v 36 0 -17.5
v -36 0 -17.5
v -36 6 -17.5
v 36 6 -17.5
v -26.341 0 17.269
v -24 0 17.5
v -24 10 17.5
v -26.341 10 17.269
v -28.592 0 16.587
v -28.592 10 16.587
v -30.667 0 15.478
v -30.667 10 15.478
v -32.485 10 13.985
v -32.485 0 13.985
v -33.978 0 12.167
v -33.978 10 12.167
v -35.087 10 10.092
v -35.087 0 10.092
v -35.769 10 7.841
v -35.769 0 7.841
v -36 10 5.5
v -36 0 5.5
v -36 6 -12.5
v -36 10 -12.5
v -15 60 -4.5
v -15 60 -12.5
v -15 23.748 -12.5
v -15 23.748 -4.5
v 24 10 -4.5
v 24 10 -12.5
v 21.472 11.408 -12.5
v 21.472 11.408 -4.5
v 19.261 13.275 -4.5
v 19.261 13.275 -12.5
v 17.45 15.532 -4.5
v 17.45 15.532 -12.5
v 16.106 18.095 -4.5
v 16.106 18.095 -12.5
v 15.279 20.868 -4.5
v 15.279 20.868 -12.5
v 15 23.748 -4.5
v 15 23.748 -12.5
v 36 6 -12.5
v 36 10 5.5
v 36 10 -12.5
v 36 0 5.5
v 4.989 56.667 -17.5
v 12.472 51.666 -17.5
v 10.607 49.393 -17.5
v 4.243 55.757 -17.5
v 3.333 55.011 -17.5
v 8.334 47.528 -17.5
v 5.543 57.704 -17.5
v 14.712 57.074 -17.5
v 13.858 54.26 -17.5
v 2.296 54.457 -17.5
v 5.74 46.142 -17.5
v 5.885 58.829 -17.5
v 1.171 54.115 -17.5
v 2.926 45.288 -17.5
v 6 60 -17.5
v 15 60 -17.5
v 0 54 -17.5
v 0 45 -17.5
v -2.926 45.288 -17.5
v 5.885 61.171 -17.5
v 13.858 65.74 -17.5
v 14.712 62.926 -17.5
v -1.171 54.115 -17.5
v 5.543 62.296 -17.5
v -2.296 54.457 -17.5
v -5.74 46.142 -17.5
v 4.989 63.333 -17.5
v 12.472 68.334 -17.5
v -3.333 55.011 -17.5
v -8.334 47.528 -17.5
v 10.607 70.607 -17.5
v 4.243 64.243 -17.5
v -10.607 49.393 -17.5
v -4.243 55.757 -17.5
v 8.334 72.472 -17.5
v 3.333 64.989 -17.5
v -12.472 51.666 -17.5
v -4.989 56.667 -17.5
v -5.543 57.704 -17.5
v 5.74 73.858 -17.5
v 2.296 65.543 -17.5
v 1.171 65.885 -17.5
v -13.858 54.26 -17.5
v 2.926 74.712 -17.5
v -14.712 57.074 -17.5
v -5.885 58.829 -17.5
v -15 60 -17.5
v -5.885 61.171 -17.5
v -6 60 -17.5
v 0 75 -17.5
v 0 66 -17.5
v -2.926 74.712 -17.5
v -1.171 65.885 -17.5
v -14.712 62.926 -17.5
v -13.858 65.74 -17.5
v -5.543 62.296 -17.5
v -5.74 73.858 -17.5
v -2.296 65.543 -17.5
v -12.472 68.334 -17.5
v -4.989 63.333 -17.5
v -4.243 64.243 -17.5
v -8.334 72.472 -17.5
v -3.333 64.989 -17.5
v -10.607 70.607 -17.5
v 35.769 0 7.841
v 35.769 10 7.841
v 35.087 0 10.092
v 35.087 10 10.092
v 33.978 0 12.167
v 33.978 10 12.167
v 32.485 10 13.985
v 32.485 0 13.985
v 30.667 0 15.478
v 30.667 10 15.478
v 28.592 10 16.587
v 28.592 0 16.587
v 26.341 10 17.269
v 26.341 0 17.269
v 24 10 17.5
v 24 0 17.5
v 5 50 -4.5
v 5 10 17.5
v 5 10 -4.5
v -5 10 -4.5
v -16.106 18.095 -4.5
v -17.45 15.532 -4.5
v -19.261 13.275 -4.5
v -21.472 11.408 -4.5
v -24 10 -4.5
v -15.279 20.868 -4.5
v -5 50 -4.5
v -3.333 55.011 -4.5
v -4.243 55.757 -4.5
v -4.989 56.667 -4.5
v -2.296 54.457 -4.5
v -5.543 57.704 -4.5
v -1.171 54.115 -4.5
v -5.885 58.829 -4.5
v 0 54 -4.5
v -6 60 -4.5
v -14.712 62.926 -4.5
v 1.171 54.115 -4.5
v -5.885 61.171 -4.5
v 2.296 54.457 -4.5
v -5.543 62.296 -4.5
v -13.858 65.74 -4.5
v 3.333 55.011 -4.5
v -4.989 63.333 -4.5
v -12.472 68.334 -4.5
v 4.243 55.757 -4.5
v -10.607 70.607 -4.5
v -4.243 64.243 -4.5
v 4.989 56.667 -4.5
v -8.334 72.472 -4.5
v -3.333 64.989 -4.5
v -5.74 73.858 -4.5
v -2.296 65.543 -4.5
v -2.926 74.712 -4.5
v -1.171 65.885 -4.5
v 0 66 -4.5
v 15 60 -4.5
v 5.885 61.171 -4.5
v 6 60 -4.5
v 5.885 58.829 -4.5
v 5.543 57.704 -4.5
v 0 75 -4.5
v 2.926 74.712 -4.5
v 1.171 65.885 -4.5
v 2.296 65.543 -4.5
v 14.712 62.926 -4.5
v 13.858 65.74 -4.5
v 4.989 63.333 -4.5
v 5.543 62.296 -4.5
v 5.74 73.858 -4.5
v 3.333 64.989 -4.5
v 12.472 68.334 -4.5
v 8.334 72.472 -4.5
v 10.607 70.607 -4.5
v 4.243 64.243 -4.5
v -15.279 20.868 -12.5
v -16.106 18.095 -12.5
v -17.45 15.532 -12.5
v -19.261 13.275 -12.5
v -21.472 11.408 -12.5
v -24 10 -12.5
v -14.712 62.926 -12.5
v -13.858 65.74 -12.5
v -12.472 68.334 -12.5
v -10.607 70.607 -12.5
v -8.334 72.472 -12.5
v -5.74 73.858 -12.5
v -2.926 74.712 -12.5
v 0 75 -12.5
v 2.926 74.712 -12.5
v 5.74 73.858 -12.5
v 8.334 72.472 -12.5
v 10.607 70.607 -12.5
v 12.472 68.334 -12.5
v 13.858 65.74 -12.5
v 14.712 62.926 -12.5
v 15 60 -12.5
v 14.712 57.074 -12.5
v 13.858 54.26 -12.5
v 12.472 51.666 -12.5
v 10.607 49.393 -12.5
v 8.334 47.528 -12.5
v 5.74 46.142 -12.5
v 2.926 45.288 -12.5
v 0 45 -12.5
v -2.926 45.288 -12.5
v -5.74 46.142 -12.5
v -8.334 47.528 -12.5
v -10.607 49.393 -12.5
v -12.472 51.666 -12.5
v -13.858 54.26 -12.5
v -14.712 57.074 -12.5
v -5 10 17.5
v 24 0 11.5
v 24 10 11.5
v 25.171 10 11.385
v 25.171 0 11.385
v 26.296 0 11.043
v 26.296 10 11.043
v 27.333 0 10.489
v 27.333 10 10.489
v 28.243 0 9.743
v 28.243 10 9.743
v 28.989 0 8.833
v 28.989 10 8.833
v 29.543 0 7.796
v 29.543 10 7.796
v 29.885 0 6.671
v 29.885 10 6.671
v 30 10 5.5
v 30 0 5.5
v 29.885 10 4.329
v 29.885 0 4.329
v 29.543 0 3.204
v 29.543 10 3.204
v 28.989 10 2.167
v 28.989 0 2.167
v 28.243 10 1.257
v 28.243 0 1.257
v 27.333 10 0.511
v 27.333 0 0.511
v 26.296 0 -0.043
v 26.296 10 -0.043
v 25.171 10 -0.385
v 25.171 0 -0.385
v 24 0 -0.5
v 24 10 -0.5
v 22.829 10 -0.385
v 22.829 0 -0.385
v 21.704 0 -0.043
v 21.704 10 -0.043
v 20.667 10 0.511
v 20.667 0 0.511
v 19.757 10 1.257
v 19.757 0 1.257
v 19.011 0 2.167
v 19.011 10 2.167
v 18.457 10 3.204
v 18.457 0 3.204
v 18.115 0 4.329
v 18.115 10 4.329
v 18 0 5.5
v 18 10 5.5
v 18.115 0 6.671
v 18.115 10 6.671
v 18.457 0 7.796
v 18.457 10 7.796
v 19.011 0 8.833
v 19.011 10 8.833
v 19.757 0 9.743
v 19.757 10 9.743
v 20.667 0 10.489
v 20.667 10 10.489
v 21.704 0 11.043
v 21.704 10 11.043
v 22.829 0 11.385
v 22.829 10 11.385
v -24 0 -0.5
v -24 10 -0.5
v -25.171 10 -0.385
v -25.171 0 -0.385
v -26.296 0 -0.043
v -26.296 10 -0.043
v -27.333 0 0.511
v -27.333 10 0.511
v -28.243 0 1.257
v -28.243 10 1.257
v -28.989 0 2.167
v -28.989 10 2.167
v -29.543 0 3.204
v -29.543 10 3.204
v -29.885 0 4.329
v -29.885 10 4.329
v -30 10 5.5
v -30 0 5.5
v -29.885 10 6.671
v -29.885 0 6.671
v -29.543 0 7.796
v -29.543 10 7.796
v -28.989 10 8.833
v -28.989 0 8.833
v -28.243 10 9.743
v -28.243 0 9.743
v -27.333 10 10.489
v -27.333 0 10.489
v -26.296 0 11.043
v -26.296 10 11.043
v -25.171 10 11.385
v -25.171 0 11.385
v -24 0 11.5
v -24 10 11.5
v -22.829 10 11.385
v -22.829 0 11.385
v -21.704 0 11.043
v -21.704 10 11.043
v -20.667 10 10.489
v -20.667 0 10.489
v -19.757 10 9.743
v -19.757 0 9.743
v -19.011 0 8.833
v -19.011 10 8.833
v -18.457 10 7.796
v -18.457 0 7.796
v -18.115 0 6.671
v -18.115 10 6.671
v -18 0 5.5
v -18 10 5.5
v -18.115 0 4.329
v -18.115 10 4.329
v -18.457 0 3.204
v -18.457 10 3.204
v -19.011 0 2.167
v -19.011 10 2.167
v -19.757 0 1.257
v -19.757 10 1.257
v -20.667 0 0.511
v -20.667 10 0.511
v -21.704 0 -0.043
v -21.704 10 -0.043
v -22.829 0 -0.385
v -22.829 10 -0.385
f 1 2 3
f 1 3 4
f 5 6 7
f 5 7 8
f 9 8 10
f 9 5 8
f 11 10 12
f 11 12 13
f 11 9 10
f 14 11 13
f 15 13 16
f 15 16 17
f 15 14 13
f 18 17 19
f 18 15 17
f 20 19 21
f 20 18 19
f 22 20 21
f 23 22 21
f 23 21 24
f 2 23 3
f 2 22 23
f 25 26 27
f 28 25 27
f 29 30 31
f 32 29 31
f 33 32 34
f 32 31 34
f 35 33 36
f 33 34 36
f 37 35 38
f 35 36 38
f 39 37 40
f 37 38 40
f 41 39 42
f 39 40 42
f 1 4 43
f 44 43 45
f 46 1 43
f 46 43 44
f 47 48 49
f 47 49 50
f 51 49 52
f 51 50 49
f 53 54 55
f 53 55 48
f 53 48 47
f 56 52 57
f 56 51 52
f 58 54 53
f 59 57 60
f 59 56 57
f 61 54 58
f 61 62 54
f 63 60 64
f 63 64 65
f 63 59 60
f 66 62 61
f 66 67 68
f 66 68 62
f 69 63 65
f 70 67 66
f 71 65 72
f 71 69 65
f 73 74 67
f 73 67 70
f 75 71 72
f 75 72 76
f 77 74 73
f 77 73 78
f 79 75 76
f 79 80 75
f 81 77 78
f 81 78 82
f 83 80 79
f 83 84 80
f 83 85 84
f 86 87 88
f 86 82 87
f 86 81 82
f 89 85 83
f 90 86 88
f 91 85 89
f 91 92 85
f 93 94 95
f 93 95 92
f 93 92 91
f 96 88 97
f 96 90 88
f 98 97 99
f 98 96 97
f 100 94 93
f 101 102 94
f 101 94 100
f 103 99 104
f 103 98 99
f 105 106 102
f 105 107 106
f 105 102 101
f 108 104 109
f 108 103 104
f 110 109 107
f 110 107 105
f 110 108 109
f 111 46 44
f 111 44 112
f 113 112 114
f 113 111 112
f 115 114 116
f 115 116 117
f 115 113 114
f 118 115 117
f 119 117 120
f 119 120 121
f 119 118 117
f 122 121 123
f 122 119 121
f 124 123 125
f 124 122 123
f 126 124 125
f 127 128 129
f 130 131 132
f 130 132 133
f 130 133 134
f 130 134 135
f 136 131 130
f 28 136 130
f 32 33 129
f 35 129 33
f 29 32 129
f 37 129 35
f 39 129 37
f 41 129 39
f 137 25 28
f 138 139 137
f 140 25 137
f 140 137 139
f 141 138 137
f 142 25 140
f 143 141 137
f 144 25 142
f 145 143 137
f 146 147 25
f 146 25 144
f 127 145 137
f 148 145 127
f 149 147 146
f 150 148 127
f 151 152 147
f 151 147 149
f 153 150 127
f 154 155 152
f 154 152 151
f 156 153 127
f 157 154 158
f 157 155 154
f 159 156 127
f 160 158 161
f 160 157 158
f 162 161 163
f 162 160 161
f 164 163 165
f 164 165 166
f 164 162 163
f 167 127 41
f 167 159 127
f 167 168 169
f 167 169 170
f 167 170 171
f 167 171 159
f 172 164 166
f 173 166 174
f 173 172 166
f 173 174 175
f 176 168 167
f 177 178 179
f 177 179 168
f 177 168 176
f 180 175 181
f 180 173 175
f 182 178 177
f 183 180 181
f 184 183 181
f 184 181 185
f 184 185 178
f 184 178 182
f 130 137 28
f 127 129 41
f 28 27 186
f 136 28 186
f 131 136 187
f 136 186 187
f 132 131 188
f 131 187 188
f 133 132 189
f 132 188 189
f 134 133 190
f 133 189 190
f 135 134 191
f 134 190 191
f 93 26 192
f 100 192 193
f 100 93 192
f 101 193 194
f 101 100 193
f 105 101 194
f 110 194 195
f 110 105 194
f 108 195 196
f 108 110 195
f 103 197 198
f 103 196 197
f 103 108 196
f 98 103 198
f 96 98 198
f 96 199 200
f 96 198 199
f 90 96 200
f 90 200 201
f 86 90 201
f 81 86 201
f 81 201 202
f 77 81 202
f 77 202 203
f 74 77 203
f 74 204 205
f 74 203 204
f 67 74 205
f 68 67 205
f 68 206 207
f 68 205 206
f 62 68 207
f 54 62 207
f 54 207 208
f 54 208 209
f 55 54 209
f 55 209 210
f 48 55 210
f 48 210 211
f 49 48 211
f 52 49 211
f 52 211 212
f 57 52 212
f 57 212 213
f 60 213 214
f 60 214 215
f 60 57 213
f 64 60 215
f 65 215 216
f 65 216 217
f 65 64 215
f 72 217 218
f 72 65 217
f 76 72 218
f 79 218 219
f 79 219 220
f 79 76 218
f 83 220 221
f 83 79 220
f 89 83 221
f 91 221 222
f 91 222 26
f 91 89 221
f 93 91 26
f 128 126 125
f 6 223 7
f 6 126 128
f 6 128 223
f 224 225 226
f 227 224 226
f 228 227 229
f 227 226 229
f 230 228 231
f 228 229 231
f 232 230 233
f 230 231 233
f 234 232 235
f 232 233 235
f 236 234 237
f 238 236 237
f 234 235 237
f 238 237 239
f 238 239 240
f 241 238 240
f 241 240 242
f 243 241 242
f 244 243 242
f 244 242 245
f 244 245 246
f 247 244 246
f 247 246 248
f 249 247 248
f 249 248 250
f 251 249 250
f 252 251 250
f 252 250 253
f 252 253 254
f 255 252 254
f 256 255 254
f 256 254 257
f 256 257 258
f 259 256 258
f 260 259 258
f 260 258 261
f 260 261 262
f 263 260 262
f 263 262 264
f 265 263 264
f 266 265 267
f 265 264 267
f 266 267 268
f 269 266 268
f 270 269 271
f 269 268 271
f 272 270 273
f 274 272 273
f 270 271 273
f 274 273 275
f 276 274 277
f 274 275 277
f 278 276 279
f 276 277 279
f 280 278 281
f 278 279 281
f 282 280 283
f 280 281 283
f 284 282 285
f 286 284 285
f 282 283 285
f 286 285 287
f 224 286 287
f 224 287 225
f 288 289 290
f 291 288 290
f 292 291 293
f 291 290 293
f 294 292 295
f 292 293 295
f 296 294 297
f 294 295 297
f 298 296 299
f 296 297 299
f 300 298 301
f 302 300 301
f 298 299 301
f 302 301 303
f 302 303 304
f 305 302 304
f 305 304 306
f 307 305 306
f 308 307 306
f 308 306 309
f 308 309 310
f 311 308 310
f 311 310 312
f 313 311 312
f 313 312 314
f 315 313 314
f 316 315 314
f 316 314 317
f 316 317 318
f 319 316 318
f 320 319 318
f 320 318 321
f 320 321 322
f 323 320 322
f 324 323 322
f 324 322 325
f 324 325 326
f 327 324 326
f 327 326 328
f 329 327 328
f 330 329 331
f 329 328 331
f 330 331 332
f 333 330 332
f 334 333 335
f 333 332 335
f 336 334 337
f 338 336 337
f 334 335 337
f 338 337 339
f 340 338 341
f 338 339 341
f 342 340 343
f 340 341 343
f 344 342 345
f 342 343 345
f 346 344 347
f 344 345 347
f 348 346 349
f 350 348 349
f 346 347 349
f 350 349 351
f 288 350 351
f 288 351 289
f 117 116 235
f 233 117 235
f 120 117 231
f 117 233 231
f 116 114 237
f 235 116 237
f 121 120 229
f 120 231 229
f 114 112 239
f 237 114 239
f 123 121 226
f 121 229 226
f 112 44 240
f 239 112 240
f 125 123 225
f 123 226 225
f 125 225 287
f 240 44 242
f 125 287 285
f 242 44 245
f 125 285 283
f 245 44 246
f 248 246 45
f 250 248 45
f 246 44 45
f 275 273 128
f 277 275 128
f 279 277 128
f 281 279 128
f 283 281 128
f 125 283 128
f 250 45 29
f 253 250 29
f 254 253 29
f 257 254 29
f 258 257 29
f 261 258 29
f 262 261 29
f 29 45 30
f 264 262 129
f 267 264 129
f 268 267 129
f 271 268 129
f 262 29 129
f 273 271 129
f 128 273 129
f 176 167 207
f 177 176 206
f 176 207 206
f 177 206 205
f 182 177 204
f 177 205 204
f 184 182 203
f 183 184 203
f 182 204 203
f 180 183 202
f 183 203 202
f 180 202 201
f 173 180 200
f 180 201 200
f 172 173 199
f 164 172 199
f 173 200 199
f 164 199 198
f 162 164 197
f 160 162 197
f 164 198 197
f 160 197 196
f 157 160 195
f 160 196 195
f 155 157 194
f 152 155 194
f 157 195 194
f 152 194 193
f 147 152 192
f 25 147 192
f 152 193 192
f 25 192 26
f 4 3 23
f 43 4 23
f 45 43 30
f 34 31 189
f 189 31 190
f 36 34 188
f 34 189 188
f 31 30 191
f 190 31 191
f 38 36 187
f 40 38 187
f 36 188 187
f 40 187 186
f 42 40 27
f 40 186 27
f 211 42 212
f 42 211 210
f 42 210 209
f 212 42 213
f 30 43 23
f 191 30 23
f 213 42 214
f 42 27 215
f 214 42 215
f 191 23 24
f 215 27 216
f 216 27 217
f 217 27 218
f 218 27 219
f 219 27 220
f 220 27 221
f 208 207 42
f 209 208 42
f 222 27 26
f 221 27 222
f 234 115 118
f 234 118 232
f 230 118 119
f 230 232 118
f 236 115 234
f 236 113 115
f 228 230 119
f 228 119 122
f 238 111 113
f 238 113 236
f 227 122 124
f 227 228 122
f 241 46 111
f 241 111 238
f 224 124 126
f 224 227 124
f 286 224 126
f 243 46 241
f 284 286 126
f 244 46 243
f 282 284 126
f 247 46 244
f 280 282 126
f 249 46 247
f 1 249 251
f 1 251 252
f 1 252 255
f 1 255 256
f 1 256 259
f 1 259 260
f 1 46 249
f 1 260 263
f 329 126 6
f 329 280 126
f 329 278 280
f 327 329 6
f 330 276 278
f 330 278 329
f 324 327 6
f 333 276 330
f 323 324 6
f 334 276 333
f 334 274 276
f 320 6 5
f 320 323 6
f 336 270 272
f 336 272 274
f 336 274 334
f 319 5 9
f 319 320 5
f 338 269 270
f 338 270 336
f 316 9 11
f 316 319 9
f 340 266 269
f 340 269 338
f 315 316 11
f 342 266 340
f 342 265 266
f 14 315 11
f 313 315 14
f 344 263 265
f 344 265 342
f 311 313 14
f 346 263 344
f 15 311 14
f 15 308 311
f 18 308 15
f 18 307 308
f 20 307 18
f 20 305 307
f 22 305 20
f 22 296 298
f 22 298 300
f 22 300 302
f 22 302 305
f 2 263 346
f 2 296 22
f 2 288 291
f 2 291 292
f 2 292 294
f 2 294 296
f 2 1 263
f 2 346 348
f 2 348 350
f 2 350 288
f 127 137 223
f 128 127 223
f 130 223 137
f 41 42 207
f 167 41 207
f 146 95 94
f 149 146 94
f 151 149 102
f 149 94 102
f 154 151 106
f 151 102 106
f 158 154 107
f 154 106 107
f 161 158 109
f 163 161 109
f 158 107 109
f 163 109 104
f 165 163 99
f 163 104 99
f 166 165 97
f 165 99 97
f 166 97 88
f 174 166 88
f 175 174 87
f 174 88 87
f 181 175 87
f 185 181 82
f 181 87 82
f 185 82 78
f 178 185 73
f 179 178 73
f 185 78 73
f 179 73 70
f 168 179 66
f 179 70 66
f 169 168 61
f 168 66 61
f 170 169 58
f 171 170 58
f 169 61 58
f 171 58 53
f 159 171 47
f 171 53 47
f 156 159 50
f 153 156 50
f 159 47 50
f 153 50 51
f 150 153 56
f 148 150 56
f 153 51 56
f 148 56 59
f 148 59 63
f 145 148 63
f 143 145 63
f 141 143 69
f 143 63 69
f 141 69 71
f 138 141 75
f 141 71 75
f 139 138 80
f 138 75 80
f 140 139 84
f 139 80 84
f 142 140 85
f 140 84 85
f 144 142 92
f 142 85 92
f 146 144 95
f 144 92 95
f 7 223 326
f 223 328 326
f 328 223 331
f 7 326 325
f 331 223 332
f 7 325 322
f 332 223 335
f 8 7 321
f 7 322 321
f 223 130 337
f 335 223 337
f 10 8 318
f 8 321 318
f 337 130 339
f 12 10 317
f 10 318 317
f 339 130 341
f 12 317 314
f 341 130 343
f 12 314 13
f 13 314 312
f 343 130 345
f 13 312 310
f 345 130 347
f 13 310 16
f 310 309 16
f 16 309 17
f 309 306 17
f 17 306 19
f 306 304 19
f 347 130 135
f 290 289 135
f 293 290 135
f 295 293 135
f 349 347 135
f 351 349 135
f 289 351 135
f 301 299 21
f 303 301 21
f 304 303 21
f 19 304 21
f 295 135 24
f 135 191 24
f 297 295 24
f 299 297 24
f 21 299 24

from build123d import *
from build123d.topology import SkipClean

# Parameters (mm, degrees)
BOSS_EXTRUDE1_DEPTH = 10
SKETCH3_W           = 5
SKETCH3_H           = 4
CUT_EXTRUDE1_DEPTH  = 74
BOSS_EXTRUDE2_DEPTH = 8
BOSS_EXTRUDE3_START = 5
SKETCH5_R           = 15
BOSS_EXTRUDE3_DEPTH = 5
SKETCH6_R           = 6
CUT_EXTRUDE2_DEPTH  = 13
RIB1_START          = -5
RIB1_DEPTH          = 10
SKETCH8_R           = 6
CUT_EXTRUDE4_DEPTH  = 11


# Read off the part's stored shape, not the designer's step: Rib1
with BuildPart() as part:
    # Sketch1 → Boss-Extrude1 (new body)
    with BuildSketch(Plane(origin=(0, 0, 0), x_dir=(1, 0, 0), z_dir=(0, 1, 0))):
        with BuildLine():
            Line((-36, 17.5), (36, 17.5))
            Line((36, 17.5), (36, -5.5))
            ThreePointArc((36, -5.5), (32.485281374, -13.985281374), (24, -17.5))
            Line((24, -17.5), (-24, -17.5))
            ThreePointArc((-24, -17.5), (-32.485281374, -13.985281374), (-36, -5.5))
            Line((-36, -5.5), (-36, 17.5))
        make_face()
    extrude(amount=BOSS_EXTRUDE1_DEPTH)

    # Sketch3 → Cut-Extrude1 (cut)
    with BuildSketch(Plane.ZY.offset(36)):
        with Locations((-15, 8)):
            Rectangle(SKETCH3_W, SKETCH3_H)
    extrude(amount=-CUT_EXTRUDE1_DEPTH, mode=Mode.SUBTRACT)

    # Sketch4 → Boss-Extrude2 (add)
    with BuildSketch(Plane(origin=(0, 0, -12.5), x_dir=(-1, 0, 0), z_dir=(0, 0, -1))):
        with BuildLine():
            Line((15, 60), (15, 23.747727085))
            ThreePointArc((15, 23.747727085), (17.450099602, 15.531888722), (24, 10))
            Line((24, 10), (-24, 10))
            ThreePointArc((-24, 10), (-17.450099602, 15.531888722), (-15, 23.747727085))
            Line((-15, 23.747727085), (-15, 60))
            ThreePointArc((-15, 60), (0, 75), (15, 60))
        make_face()
    extrude(amount=-BOSS_EXTRUDE2_DEPTH)

    # Sketch5 → Boss-Extrude3 (add)
    with SkipClean():  # the faces are left unmerged after this step: merging them gives an invalid solid
        with BuildSketch(Plane(origin=(0, 0, -12.5), x_dir=(-1, 0, 0), z_dir=(0, 0, -1)).offset(BOSS_EXTRUDE3_START)):
            with Locations((0, 60)):
                Circle(SKETCH5_R)
        extrude(amount=-BOSS_EXTRUDE3_DEPTH)

    # Sketch6 → Cut-Extrude2 (cut)
    with SkipClean():  # the faces are left unmerged after this step: merging them gives an invalid solid
        with BuildSketch(Plane(origin=(0, 0, -17.5), x_dir=(-1, 0, 0), z_dir=(0, 0, -1))):
            with Locations((0, 60)):
                Circle(SKETCH6_R)
        extrude(amount=-CUT_EXTRUDE2_DEPTH, mode=Mode.SUBTRACT)

    # Rib1 outline → Rib1 (add)
    with SkipClean():  # the faces are left unmerged after this step: merging them gives an invalid solid
        with BuildSketch(Plane(origin=(0, 0, 0), x_dir=(0, 0, -1), z_dir=(1, 0, 0)).offset(RIB1_START)):
            Polygon((4.5, 50), (-17.5, 10), (4.5, 10), align=None)
        extrude(amount=RIB1_DEPTH)

    # Sketch8 → Cut-Extrude4 (cut)
    with SkipClean():  # the faces are left unmerged after this step: merging them gives an invalid solid
        with BuildSketch(Plane(origin=(0, 10, 0), x_dir=(1, 0, 0), z_dir=(0, 1, 0))):
            with Locations(Location((24, -5.5, 0), (0, 0, 270))):
                Circle(SKETCH8_R)
            with Locations(Location((-24, -5.5, 0), (0, 0, 90))):
                Circle(SKETCH8_R)
        extrude(amount=-CUT_EXTRUDE4_DEPTH, mode=Mode.SUBTRACT)


solid = part.part
